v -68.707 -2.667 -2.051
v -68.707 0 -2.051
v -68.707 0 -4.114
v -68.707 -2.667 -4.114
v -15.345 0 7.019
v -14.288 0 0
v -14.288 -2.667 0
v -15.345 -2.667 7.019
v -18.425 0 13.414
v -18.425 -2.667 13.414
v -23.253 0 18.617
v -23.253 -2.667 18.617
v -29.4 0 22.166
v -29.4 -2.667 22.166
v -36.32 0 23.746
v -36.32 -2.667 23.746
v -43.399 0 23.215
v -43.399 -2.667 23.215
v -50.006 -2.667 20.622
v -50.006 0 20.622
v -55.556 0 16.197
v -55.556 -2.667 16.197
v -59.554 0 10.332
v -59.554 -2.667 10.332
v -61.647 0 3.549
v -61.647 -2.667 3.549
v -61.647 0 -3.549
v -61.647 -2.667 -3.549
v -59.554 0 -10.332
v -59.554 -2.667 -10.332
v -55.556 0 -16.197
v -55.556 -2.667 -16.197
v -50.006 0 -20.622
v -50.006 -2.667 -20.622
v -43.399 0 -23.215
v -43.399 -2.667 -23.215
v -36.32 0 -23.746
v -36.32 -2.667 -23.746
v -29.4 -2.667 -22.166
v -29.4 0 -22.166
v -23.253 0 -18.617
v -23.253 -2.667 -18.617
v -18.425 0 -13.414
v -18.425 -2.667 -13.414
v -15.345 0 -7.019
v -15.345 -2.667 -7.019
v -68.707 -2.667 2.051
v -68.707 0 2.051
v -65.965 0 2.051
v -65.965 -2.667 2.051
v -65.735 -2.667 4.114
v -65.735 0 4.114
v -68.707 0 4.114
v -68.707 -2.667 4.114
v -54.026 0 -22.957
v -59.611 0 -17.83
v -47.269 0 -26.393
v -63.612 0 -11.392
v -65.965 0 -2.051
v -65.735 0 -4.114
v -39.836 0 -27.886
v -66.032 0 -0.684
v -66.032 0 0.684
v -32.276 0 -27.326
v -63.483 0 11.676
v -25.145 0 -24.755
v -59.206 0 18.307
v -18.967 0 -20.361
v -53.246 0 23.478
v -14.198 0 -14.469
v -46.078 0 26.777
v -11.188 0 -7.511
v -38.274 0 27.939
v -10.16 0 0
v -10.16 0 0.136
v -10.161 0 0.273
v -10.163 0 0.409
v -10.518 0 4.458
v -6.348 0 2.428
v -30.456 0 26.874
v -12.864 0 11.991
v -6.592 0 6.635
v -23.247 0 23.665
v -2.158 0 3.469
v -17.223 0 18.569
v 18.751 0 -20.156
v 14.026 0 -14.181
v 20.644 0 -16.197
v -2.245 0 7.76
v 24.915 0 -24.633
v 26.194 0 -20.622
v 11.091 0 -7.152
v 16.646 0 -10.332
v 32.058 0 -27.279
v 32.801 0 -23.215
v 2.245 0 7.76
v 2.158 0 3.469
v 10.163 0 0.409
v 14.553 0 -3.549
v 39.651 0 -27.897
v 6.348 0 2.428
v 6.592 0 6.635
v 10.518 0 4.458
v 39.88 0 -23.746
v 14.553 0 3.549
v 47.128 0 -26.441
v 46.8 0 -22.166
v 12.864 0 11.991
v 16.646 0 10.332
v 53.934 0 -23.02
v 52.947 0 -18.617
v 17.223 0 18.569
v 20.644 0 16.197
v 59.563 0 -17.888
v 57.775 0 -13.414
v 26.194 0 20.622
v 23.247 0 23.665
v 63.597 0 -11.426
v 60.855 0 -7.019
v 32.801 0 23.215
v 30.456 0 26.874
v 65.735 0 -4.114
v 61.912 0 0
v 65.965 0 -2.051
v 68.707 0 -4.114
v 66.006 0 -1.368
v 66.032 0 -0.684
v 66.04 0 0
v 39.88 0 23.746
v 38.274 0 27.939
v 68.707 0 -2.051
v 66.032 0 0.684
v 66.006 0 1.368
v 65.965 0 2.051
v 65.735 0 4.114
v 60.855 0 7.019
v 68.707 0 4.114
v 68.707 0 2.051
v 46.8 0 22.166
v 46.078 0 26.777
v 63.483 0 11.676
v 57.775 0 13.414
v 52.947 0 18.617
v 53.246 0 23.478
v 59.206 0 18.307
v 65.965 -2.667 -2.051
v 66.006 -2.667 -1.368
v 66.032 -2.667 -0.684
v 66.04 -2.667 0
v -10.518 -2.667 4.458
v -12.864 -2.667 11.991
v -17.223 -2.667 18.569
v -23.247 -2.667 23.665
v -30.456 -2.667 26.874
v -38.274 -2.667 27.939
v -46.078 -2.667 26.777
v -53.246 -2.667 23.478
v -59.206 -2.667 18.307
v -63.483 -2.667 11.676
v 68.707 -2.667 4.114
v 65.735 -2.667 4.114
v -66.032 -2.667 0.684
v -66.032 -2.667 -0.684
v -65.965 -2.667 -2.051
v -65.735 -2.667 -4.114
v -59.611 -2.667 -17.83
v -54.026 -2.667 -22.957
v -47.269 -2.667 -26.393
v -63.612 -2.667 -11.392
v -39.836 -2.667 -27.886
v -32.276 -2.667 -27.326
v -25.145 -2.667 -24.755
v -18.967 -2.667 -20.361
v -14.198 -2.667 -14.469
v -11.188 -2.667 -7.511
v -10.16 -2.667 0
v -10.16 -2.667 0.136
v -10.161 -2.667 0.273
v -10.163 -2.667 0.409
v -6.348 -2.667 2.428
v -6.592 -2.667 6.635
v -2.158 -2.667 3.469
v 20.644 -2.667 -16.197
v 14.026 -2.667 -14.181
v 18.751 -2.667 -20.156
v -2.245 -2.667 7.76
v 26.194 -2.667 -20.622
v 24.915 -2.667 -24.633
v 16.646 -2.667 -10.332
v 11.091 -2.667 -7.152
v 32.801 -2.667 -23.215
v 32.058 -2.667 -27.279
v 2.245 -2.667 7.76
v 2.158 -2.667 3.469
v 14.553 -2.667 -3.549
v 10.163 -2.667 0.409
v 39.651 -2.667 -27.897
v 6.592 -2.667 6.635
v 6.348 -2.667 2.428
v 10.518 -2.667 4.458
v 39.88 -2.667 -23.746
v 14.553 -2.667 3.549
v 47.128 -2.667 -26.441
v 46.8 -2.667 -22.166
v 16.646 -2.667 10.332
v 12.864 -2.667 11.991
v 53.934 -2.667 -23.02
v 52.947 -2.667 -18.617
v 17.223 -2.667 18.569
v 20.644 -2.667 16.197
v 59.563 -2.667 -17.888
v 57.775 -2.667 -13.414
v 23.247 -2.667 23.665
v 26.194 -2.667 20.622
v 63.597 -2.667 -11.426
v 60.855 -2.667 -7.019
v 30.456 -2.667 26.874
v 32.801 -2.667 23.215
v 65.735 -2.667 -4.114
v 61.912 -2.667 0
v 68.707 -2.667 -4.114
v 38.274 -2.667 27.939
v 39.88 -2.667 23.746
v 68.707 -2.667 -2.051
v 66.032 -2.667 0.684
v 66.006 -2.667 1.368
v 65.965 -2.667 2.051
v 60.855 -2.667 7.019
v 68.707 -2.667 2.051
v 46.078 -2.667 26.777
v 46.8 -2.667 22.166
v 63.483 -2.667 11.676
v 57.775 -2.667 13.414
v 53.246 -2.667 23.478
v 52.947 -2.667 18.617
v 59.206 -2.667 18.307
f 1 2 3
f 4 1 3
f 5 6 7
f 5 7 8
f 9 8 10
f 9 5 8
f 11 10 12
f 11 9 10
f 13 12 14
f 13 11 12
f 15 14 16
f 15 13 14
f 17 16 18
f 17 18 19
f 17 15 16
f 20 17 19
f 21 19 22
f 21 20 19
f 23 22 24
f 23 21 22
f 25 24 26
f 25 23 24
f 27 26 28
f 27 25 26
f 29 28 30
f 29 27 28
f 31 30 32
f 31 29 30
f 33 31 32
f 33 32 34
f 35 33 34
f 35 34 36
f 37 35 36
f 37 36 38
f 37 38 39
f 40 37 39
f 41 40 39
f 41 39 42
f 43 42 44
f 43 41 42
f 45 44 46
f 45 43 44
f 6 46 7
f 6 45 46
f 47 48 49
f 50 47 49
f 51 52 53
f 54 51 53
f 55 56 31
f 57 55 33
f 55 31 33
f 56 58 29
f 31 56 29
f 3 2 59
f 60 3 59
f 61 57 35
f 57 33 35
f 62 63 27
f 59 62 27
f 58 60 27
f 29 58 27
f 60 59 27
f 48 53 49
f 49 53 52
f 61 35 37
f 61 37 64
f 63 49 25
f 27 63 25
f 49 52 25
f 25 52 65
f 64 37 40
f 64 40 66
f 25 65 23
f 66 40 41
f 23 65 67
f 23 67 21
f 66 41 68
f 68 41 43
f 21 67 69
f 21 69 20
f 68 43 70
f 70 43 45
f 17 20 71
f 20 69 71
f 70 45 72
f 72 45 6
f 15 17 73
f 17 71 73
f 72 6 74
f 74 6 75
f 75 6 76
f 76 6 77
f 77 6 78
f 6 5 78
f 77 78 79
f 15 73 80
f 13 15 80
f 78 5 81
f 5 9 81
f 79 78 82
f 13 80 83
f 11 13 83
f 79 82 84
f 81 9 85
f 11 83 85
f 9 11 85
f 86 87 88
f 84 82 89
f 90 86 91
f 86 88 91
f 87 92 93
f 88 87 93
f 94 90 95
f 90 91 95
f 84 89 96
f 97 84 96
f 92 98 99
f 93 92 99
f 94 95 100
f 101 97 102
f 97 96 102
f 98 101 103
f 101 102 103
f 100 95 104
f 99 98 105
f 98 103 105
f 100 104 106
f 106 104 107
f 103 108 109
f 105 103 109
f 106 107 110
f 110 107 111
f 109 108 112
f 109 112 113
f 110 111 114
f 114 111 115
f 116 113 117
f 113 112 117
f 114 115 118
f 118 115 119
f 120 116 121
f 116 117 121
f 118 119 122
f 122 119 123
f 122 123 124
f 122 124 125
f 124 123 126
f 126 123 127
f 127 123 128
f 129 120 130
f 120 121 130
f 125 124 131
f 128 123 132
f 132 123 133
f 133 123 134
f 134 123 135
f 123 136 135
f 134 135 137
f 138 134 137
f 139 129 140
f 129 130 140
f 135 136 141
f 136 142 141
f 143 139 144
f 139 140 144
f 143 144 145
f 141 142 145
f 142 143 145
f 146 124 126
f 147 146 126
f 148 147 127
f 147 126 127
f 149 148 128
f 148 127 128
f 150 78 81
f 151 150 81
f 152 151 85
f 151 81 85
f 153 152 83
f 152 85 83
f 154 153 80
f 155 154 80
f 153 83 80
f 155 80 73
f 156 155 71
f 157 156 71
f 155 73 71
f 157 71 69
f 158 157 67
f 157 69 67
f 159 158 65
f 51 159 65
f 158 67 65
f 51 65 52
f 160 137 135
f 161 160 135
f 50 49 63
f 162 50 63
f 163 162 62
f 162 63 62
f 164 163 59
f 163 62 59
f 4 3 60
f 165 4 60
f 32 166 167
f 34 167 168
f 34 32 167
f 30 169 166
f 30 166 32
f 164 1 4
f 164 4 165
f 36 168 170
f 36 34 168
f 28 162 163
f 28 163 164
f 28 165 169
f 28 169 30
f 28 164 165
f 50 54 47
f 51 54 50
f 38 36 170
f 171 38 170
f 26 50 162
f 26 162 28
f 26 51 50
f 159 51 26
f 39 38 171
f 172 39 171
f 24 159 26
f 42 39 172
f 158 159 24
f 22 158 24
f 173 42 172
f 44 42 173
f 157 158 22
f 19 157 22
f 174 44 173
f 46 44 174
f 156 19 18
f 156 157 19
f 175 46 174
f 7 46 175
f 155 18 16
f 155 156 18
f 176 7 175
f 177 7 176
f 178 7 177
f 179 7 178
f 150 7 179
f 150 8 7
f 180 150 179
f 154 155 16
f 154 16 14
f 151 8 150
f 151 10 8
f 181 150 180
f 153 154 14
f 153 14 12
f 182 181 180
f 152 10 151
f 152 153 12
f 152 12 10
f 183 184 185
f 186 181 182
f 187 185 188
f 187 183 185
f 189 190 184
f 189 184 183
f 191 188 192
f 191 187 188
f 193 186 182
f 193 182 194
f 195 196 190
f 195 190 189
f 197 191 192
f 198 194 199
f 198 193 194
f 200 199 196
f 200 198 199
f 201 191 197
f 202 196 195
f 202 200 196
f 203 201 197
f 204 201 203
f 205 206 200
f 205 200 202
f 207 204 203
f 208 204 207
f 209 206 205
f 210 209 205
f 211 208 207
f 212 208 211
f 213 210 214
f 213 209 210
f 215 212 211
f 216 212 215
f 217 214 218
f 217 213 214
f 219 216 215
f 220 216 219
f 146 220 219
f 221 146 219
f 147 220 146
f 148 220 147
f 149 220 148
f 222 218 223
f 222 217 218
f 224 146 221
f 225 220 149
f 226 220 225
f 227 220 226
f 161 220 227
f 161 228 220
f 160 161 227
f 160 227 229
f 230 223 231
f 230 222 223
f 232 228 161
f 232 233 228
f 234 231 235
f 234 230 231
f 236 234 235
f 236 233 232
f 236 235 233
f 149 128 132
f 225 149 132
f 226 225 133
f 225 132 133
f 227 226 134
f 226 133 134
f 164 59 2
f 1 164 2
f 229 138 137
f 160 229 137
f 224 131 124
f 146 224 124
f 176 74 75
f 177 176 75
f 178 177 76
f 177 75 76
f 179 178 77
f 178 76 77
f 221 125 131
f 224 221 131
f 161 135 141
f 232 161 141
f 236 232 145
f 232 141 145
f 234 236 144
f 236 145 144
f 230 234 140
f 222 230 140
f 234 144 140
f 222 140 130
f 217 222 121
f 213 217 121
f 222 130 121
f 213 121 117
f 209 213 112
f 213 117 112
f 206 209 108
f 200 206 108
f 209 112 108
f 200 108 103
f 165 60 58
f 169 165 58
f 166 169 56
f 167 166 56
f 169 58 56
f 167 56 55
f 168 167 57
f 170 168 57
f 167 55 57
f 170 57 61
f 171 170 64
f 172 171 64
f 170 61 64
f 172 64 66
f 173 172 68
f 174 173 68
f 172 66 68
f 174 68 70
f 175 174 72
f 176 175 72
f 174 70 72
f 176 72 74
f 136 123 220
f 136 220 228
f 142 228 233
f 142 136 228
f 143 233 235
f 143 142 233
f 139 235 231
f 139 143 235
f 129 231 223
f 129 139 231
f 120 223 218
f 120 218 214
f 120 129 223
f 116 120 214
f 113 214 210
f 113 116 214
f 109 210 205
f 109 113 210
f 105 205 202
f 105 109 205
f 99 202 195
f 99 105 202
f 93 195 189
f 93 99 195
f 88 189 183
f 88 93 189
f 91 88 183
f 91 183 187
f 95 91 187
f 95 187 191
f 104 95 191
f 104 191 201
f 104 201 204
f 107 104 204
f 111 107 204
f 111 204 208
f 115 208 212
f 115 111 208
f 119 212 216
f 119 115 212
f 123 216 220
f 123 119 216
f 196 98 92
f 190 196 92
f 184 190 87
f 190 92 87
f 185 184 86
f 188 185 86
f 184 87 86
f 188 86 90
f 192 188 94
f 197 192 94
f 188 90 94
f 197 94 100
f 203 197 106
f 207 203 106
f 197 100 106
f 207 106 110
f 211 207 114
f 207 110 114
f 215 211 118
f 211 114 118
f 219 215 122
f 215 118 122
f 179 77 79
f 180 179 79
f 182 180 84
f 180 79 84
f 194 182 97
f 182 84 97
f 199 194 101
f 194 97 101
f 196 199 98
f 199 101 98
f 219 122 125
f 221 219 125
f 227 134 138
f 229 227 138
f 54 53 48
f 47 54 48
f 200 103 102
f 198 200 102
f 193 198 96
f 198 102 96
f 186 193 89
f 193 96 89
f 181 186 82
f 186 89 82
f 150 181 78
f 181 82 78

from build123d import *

# Parameters (mm, degrees)
F0_R     = 23.8125
F1_DEPTH = 2.667


with BuildPart() as f1:
    # F0 (on Front) → F1 (new body)
    with BuildSketch(Plane.XZ):
        with BuildLine():
            ThreePointArc((-65.964614, 2.051073), (-65.869192, 3.084735), (-65.735439, 4.114139))
            Line((-65.735439, 4.114139), (-68.707, 4.114139))
            Line((-68.707, 4.114139), (-68.707, 2.051073))
            Line((-68.707, 2.051073), (-65.964614, 2.051073))
        make_face()
        with BuildLine():
            ThreePointArc((-65.735439, -4.114139), (-36.037302, -27.863756), (-10.16, 0))
            ThreePointArc((-10.16, 0), (-10.160749, 0.204565), (-10.162995, 0.40912))
            ThreePointArc((-10.162995, 0.40912), (-10.266731, 2.439818), (-10.517878, 4.457595))
            ThreePointArc((-10.517878, 4.457595), (-38.273785, 27.93946), (-65.735439, 4.114139))
            ThreePointArc((-65.735439, 4.114139), (-65.869192, 3.084735), (-65.964614, 2.051073))
            ThreePointArc((-65.964614, 2.051073), (-66.04, 0), (-65.964614, -2.051073))
            ThreePointArc((-65.964614, -2.051073), (-65.869192, -3.084735), (-65.735439, -4.114139))
        make_face()
        with Locations((-38.1, 0)):
            Circle(F0_R, mode=Mode.SUBTRACT)
        with BuildLine():
            Line((-68.707, -4.114139), (-65.735439, -4.114139))
            ThreePointArc((-65.735439, -4.114139), (-65.869192, -3.084735), (-65.964614, -2.051073))
            Line((-65.964614, -2.051073), (-68.707, -2.051073))
            Line((-68.707, -2.051073), (-68.707, -4.114139))
        make_face()
        with BuildLine():
            ThreePointArc((-10.517878, 4.457595), (-10.266731, 2.439818), (-10.162995, 0.40912))
            ThreePointArc((-10.162995, 0.40912), (0, 3.600017), (10.162995, 0.40912))
            ThreePointArc((10.162995, 0.40912), (10.266731, 2.439818), (10.517878, 4.457595))
            ThreePointArc((10.517878, 4.457595), (0, 7.902232), (-10.517878, 4.457595))
        make_face()
        with BuildLine():
            ThreePointArc((10.517878, 4.457595), (10.266731, 2.439818), (10.162995, 0.40912))
            ThreePointArc((10.162995, 0.40912), (35.83335, -27.847907), (65.735439, -4.114139))
            ThreePointArc((65.735439, -4.114139), (65.869192, -3.084735), (65.964614, -2.051073))
            ThreePointArc((65.964614, -2.051073), (66.021147, -1.026229), (66.04, 0))
            ThreePointArc((66.04, 0), (66.021147, 1.026229), (65.964614, 2.051073))
            ThreePointArc((65.964614, 2.051073), (65.869192, 3.084735), (65.735439, 4.114139))
            ThreePointArc((65.735439, 4.114139), (38.273785, 27.93946), (10.517878, 4.457595))
        make_face()
        with Locations((38.1, 0)):
            Circle(F0_R, mode=Mode.SUBTRACT)
        with BuildLine():
            ThreePointArc((65.964614, -2.051073), (65.869192, -3.084735), (65.735439, -4.114139))
            Line((65.735439, -4.114139), (68.707, -4.114139))
            Line((68.707, -4.114139), (68.707, -2.051073))
            Line((68.707, -2.051073), (65.964614, -2.051073))
        make_face()
        with BuildLine():
            Line((68.707, 4.114139), (65.735439, 4.114139))
            ThreePointArc((65.735439, 4.114139), (65.869192, 3.084735), (65.964614, 2.051073))
            Line((65.964614, 2.051073), (68.707, 2.051073))
            Line((68.707, 2.051073), (68.707, 4.114139))
        make_face()
    extrude(amount=F1_DEPTH)


solid = f1.part
